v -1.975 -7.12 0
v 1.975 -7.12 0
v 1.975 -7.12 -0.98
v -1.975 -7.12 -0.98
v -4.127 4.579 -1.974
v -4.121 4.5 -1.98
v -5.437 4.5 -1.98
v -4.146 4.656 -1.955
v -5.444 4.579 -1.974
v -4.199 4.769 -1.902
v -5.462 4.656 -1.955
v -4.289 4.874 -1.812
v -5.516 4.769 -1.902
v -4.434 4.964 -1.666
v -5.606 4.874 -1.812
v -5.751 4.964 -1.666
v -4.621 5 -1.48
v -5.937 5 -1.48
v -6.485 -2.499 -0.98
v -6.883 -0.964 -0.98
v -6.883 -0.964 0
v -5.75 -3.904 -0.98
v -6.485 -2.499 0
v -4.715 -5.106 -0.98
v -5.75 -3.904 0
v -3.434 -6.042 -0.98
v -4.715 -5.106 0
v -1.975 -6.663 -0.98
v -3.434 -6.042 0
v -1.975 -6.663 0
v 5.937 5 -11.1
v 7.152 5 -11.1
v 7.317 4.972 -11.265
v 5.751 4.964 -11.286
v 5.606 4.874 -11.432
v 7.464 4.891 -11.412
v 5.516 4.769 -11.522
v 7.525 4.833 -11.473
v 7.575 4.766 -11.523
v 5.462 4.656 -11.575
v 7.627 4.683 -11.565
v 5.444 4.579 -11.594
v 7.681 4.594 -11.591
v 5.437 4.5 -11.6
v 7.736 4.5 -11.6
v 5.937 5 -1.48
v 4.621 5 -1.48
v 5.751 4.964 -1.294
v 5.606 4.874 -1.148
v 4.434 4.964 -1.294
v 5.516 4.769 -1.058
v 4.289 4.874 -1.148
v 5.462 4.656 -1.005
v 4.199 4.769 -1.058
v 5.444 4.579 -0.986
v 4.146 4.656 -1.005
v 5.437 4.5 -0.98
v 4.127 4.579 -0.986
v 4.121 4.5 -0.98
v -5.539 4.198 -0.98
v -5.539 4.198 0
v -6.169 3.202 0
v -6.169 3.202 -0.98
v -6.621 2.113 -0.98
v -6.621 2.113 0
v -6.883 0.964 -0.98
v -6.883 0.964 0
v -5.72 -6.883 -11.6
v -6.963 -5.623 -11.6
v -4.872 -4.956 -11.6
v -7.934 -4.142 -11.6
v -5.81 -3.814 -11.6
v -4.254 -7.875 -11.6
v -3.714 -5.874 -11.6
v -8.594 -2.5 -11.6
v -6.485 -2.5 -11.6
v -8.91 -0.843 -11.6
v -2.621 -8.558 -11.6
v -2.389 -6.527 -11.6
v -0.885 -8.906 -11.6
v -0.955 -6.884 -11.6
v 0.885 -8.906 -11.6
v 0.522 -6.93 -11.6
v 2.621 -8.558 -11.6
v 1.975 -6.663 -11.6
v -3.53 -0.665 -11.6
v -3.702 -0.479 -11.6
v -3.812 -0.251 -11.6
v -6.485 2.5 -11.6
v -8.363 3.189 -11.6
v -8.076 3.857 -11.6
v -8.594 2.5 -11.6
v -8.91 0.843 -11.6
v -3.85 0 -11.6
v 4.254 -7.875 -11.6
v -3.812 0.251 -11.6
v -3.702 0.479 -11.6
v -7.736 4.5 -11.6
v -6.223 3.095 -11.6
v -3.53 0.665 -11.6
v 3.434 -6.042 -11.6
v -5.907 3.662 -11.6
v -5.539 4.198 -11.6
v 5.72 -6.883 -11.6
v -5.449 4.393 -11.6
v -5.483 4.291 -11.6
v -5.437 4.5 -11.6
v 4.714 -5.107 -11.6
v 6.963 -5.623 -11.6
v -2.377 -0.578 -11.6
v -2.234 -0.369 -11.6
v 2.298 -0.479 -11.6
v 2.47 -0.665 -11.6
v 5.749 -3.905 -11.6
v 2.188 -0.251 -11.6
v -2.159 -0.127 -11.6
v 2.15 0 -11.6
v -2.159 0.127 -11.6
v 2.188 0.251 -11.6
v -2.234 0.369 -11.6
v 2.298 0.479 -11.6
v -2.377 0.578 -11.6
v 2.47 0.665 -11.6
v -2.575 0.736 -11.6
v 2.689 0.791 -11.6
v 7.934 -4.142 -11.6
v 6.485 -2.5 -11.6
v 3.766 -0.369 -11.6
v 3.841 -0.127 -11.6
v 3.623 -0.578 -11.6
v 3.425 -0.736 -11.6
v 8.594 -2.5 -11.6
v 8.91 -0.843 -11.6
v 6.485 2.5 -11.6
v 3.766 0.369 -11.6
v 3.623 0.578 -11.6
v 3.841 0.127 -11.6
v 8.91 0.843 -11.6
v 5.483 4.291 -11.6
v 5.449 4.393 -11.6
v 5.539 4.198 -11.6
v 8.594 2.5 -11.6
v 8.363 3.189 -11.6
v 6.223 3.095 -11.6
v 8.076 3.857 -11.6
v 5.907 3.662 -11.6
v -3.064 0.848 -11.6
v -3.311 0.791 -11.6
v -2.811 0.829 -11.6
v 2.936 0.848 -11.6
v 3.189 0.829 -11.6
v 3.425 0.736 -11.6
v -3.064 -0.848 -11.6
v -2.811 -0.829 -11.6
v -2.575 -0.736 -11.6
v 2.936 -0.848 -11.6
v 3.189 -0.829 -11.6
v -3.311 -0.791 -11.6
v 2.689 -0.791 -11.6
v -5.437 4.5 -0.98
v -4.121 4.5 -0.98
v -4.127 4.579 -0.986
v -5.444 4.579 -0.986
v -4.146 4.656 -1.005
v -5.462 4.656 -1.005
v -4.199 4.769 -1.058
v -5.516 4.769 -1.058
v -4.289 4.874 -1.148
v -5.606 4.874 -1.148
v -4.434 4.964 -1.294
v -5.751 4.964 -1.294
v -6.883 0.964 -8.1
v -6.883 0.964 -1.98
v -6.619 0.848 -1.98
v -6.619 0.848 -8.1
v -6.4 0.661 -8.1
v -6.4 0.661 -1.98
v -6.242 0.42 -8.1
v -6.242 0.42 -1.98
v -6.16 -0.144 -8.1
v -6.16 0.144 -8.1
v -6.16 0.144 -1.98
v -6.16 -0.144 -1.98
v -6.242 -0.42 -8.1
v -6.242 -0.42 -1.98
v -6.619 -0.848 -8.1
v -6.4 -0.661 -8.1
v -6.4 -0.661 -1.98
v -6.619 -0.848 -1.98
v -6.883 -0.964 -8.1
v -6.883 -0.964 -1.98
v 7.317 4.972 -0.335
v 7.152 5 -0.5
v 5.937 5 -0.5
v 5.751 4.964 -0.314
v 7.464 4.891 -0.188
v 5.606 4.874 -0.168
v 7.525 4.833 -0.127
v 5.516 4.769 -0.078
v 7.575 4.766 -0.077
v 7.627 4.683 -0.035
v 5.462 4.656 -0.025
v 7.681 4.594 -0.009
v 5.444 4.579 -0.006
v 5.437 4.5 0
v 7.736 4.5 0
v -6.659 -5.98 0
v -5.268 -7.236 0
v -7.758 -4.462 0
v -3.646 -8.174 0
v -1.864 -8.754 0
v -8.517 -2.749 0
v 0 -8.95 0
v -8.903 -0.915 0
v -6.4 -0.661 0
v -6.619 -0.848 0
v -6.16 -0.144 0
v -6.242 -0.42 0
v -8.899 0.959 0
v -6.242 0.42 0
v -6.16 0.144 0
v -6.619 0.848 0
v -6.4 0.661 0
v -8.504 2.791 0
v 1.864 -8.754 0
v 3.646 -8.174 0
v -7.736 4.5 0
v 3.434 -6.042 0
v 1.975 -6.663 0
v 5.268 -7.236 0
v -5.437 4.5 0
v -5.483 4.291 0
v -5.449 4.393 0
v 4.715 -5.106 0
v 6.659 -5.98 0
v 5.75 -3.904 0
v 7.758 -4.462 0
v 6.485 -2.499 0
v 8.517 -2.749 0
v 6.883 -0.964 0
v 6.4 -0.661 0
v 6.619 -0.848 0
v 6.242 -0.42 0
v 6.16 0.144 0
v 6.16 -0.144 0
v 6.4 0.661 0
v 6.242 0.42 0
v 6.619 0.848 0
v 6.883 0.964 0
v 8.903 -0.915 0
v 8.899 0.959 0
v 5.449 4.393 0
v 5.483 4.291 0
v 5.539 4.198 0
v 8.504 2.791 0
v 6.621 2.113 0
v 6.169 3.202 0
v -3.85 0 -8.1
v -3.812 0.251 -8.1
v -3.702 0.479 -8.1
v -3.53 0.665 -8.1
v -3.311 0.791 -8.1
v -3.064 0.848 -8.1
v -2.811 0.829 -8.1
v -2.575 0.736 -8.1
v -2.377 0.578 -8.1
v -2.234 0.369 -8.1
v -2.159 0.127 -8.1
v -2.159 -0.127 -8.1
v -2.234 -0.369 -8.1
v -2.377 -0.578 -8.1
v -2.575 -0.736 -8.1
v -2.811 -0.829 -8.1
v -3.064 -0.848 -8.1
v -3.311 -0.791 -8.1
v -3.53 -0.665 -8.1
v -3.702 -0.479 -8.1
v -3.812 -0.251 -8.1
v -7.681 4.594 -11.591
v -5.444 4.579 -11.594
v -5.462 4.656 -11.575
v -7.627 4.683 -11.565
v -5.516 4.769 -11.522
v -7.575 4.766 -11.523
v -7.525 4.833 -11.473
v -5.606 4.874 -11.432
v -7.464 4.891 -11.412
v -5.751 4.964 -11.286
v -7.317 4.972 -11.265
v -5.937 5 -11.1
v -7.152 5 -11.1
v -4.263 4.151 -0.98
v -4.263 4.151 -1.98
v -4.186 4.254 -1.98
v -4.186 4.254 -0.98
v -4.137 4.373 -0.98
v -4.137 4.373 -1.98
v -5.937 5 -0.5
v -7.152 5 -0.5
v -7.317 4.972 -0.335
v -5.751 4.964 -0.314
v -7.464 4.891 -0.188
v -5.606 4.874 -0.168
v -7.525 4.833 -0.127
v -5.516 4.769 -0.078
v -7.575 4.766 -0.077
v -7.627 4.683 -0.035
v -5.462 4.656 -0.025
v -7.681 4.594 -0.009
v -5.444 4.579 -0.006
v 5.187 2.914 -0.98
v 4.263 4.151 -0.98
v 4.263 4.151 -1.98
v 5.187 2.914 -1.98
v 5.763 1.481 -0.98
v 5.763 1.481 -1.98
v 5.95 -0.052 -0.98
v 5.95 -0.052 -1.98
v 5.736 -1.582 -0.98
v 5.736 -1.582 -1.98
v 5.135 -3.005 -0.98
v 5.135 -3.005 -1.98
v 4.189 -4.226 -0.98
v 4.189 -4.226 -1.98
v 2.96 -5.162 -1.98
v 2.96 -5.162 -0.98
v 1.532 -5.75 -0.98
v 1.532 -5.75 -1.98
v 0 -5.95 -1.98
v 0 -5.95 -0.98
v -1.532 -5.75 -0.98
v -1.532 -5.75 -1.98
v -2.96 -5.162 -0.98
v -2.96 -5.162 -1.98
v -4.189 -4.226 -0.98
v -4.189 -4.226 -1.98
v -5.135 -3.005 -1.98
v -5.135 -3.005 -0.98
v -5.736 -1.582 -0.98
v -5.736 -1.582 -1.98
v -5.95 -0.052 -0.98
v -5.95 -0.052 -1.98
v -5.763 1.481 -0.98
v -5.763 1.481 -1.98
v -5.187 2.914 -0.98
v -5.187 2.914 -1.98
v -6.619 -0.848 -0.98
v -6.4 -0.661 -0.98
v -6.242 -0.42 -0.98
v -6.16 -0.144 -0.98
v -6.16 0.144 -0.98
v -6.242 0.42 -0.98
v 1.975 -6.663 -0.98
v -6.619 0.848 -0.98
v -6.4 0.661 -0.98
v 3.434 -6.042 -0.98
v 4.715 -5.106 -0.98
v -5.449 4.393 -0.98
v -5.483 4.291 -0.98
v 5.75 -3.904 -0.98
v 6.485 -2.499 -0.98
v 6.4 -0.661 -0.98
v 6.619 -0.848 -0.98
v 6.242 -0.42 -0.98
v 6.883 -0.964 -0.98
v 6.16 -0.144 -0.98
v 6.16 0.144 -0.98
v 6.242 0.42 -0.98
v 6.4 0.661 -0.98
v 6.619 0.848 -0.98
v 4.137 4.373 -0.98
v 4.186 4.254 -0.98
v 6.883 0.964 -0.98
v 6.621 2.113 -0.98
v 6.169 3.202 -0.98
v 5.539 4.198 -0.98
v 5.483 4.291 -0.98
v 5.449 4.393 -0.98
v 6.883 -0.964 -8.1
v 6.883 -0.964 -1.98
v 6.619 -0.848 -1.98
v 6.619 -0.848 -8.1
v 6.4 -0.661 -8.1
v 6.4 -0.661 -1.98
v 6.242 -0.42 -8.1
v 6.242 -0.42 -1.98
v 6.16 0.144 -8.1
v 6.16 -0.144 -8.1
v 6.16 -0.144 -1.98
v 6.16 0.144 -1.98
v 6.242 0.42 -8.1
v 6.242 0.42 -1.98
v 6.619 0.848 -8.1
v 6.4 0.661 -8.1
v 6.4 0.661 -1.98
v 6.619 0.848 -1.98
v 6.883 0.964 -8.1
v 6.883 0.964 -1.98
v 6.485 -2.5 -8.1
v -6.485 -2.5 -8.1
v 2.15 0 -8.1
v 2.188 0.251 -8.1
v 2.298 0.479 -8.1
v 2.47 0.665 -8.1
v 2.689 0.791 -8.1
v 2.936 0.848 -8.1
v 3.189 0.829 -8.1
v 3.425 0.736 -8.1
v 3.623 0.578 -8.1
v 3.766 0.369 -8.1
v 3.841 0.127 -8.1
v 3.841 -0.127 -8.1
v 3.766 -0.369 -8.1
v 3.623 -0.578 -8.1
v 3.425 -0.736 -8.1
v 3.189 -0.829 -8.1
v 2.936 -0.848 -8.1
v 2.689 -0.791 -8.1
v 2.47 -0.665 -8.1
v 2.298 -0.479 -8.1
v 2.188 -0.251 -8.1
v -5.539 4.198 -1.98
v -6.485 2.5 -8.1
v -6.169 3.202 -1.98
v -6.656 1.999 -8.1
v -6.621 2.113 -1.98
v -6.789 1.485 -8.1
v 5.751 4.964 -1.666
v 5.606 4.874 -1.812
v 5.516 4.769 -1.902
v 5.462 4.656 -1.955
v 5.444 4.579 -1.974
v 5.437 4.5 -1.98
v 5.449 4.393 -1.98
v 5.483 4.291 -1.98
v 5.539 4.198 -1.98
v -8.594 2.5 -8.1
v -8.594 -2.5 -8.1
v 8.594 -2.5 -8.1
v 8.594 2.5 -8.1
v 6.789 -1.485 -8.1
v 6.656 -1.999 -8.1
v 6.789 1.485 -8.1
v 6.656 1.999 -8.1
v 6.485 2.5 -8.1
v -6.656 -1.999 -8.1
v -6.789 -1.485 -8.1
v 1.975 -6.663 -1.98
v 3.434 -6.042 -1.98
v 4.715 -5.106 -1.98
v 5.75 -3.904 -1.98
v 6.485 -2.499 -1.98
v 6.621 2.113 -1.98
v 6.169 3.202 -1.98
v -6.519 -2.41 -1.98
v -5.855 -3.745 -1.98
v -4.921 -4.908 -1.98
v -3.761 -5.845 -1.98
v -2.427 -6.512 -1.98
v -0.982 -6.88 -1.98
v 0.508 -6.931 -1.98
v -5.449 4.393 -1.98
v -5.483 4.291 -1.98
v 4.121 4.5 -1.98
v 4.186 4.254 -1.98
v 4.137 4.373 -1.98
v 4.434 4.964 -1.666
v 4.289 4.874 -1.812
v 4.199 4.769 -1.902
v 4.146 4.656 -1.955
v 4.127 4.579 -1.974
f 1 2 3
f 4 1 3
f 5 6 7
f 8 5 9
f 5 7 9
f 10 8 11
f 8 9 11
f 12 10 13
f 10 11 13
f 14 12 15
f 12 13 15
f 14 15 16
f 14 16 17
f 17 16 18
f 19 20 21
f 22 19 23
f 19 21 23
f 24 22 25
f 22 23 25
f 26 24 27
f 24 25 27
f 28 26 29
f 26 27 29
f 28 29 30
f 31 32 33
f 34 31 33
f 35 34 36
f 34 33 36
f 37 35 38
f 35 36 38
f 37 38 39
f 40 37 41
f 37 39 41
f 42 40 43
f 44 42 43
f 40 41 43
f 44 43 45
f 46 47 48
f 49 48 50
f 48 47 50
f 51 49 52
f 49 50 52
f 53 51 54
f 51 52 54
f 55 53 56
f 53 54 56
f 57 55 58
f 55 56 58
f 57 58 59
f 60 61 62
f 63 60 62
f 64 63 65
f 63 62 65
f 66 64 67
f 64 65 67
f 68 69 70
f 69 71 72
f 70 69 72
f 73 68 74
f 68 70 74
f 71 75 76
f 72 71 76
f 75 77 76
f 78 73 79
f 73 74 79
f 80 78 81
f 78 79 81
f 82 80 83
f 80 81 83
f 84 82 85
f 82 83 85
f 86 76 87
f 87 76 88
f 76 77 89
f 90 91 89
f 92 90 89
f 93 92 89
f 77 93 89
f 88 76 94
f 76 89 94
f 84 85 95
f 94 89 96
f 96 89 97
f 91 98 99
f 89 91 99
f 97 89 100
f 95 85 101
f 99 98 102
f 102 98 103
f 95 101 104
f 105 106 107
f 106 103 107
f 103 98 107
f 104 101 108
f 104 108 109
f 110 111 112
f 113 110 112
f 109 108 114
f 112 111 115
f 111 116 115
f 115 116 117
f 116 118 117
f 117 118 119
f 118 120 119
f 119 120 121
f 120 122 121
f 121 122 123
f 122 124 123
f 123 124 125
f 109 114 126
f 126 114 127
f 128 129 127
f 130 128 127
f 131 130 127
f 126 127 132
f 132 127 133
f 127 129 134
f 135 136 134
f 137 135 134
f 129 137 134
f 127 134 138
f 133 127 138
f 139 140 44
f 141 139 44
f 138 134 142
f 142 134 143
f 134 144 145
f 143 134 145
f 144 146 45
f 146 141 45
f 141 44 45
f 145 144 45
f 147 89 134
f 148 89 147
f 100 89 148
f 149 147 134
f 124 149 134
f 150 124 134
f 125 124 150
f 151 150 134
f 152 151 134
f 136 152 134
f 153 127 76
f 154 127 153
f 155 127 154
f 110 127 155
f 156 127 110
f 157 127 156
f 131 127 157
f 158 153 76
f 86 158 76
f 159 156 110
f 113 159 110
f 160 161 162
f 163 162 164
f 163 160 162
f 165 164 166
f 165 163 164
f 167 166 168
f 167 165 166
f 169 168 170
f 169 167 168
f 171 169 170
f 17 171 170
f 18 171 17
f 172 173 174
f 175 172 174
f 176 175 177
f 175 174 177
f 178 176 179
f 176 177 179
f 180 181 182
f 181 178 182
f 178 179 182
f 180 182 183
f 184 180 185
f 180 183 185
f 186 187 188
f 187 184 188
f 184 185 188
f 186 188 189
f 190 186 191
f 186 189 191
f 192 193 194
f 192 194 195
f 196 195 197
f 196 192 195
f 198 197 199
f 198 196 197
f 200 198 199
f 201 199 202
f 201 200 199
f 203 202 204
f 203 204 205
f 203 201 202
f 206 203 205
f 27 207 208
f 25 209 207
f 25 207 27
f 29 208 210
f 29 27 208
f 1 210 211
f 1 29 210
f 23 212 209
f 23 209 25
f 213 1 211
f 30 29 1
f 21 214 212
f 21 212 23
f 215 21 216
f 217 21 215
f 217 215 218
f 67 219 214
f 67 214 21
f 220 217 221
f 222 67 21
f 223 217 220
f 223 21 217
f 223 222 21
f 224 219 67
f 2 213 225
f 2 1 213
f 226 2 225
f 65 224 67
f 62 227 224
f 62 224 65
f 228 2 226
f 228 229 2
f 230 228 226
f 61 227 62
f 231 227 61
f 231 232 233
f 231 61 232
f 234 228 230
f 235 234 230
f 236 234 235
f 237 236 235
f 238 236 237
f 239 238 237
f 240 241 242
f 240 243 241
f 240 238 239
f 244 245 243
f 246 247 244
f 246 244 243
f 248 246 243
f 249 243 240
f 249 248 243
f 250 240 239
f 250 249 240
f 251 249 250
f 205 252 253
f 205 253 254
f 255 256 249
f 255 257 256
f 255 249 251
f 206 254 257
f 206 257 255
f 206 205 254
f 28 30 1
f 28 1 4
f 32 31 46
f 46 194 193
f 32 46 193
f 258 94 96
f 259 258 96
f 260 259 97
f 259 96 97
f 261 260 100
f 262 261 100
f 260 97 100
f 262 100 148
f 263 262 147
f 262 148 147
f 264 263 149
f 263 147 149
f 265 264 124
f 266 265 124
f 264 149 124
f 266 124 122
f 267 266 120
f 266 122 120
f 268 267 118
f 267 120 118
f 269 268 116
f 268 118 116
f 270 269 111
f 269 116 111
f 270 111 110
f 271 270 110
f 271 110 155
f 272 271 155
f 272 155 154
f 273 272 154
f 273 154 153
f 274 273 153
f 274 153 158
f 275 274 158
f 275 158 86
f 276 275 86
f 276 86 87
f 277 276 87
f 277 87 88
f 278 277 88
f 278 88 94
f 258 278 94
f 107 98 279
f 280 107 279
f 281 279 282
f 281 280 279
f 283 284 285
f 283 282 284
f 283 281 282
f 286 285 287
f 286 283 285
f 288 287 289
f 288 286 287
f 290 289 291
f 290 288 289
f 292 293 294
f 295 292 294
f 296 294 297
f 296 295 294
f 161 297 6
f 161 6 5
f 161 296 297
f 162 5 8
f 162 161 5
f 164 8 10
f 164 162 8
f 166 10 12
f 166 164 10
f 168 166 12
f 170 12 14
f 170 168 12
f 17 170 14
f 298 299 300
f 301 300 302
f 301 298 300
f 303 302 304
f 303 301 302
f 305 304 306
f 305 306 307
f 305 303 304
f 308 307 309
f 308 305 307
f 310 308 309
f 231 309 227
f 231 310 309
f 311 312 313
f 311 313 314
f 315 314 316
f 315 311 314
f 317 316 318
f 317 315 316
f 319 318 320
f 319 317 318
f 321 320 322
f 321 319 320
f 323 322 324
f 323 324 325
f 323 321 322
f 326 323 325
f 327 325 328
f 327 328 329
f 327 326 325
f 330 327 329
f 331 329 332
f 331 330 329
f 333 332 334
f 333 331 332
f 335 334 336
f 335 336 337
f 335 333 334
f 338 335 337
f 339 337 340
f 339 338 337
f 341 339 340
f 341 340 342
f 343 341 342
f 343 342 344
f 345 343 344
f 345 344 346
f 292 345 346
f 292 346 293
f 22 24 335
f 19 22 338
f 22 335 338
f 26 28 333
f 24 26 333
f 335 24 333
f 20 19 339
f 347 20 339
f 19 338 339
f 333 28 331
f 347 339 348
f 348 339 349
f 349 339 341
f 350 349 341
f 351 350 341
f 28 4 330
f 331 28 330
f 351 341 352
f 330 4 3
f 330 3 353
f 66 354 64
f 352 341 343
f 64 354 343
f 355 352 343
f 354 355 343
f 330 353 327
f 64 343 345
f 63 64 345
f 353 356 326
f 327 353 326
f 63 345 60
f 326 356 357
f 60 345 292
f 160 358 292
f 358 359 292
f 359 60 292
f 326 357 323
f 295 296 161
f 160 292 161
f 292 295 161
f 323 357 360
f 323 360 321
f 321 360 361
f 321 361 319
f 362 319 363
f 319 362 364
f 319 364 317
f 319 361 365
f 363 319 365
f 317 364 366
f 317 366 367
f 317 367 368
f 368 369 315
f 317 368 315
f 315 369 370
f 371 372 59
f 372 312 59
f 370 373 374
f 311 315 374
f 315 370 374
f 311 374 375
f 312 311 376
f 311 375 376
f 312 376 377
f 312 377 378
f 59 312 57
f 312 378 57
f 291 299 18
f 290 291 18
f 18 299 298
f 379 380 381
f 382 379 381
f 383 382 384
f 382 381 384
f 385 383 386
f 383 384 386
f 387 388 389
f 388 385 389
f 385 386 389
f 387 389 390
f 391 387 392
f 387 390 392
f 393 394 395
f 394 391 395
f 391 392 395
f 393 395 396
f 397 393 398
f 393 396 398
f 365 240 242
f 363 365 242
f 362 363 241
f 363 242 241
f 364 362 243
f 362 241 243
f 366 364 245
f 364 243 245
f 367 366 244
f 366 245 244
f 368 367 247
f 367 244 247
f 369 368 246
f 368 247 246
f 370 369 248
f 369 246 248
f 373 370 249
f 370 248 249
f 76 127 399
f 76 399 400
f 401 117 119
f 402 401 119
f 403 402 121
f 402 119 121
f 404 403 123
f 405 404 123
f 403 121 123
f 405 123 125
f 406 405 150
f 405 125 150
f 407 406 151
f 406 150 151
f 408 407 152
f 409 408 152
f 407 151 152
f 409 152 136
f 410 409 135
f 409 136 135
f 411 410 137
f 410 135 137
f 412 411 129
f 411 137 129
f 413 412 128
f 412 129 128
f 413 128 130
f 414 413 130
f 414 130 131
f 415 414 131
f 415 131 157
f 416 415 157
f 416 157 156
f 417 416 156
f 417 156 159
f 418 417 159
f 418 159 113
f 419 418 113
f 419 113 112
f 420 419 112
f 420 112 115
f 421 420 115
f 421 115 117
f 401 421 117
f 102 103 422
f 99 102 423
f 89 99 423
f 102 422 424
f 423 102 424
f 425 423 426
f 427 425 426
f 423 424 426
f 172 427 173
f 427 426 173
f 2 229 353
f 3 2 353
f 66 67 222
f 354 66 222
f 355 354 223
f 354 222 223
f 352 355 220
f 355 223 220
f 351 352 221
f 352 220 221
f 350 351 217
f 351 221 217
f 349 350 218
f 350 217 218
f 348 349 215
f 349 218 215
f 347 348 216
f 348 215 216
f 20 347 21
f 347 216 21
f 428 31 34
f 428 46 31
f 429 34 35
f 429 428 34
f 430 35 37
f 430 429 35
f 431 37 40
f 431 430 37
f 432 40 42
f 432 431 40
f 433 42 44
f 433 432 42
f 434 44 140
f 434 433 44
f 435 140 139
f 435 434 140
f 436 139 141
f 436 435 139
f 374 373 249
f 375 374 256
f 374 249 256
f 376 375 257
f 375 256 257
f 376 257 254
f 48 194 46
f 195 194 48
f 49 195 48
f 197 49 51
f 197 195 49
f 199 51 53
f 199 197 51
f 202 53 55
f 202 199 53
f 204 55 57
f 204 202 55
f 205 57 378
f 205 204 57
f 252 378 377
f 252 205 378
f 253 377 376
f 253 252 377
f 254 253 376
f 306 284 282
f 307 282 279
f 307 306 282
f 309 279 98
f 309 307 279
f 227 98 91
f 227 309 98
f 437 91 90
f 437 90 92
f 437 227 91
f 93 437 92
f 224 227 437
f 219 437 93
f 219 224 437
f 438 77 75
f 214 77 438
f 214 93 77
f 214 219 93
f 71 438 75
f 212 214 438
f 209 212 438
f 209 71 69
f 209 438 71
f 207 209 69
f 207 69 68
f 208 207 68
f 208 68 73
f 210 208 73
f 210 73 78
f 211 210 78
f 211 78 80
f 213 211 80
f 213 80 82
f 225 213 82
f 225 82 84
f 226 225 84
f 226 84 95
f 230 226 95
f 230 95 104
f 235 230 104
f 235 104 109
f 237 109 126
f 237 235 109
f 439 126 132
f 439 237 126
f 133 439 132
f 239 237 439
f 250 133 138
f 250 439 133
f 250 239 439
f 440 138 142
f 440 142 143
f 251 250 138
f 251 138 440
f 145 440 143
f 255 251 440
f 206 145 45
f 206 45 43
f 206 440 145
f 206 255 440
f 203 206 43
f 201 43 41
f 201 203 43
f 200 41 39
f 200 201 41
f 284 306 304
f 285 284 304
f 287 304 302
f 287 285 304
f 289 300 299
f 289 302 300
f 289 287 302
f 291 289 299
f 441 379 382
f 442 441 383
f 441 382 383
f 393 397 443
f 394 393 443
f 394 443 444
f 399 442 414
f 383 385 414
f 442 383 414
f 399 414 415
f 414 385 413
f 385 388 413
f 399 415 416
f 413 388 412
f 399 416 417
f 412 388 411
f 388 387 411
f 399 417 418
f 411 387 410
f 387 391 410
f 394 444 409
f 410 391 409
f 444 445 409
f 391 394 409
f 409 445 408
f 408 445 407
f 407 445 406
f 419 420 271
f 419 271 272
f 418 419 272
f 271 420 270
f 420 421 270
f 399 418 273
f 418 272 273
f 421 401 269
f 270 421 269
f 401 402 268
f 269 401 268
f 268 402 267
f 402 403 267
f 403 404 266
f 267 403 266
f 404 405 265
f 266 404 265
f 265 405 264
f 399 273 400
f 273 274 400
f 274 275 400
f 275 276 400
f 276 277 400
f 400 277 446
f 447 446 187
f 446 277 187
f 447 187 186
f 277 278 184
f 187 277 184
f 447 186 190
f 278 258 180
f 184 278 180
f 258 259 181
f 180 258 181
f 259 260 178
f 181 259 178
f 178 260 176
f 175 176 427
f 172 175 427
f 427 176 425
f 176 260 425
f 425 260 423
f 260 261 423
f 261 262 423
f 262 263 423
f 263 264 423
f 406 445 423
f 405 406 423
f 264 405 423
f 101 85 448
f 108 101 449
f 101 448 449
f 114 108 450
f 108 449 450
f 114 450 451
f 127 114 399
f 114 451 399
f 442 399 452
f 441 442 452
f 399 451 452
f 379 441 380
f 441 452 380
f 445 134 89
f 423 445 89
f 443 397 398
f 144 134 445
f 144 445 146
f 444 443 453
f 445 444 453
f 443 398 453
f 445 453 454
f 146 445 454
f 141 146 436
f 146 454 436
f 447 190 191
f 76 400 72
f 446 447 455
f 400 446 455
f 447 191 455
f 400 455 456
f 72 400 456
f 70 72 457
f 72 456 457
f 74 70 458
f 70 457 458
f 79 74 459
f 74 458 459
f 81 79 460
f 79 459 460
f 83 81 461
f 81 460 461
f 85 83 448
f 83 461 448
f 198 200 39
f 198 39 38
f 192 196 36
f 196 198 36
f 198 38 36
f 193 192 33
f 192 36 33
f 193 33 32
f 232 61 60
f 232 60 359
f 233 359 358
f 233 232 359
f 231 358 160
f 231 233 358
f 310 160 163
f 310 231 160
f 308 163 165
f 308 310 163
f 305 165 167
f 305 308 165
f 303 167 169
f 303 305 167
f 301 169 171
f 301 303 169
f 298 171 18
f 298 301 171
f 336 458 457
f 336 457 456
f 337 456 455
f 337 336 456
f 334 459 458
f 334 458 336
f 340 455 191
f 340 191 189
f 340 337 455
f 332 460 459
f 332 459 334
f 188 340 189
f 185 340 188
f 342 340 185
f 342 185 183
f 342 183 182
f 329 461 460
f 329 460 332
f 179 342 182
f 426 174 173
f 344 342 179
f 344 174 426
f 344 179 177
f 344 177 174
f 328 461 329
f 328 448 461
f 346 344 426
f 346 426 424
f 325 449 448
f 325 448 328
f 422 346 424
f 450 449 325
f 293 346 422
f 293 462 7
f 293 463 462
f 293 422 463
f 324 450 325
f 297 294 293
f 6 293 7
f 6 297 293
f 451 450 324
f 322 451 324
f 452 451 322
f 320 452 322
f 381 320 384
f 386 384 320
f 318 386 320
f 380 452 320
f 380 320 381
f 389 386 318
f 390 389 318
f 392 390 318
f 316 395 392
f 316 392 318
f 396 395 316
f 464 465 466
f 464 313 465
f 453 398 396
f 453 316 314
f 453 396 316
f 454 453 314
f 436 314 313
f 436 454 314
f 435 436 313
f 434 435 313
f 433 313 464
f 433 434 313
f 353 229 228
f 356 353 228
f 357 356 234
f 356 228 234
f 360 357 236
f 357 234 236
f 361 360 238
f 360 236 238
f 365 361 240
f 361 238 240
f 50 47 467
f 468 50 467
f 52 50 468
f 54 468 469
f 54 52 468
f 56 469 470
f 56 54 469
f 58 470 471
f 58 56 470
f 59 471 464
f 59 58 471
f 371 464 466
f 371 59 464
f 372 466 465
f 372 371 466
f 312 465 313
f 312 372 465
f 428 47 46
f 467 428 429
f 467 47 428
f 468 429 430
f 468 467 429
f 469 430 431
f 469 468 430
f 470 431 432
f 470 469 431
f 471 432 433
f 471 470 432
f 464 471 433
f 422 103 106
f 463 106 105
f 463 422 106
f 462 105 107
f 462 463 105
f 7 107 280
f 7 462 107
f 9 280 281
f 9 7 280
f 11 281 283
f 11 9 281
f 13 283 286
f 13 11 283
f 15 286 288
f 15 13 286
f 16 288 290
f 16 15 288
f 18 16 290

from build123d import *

# Parameters (mm, degrees)
SKETCH_3_R          = 6.95
SKETCH_3_R_2        = 5.95
EXTRUDE_3_DEPTH     = 1
SKETCH_1_R          = 8.95
EXTRUDE_1_DEPTH     = 11.6
CUT_EXTRUDE_1_DEPTH = 18.16872156
FILLET_4_R          = 0.5
SKETCH_5_W          = 17.187495454
SKETCH_5_H          = 5
EXTRUDE_4_DEPTH     = 3.5
SKETCH_6_W          = 0.98
SKETCH_6_H          = 0.456526807
CUT_EXTRUDE_2_DEPTH = 3.95
CUT_EXTRUDE_3_REACH = 19.169
SKETCH_8_R          = 0.85


with BuildPart() as part:
    # 草图3 → 凸台-拉伸3 (new body)
    with BuildSketch(Plane(origin=(0, 0, -0.98), x_dir=(-1, 0, 0), z_dir=(0, 0, -1))):
        with Locations(Location((0, 0, 0), (0, 0, 90))):
            Circle(SKETCH_3_R)
        with Locations(Location((0, 0, 0), (0, 0, 90))):
            Circle(SKETCH_3_R_2, mode=Mode.SUBTRACT)
    extrude(amount=EXTRUDE_3_DEPTH)

    # 草图1 → 凸台-拉伸1 (add)
    with BuildSketch(Plane.XY):
        Circle(SKETCH_1_R)
        with BuildLine():
            ThreePointArc((1.975, 6.663473193), (-3.760818846, 5.844548024), (-6.882867133, 0.963659707))
            ThreePointArc((-6.882867133, 0.963659707), (-6.15, 0), (-6.882867133, -0.963659707))
            ThreePointArc((-6.882867133, -0.963659707), (-3.760818846, -5.844548024), (1.975, -6.663473193))
            ThreePointArc((1.975, -6.663473193), (5.266632793, -4.53487365), (6.882867133, -0.963659707))
            ThreePointArc((6.882867133, -0.963659707), (6.15, 0), (6.882867133, 0.963659707))
            ThreePointArc((6.882867133, 0.963659707), (5.266632793, 4.53487365), (1.975, 6.663473193))
        make_face(mode=Mode.SUBTRACT)
    extrude(amount=-EXTRUDE_1_DEPTH)

    # 草图4 → 切除-拉伸1 (cut, through all)
    with BuildSketch(Plane.XY):
        with BuildLine():
            Line((-7.423105819, 5), (7.423105819, 5))
            ThreePointArc((7.423105819, 5), (0, 8.95), (-7.423105819, 5))
        make_face()
    extrude(amount=-CUT_EXTRUDE_1_DEPTH, mode=Mode.SUBTRACT)

    # 圆角4
    fillet_4_edges = [part.edges().sort_by_distance(p)[0] for p in [
        (6.125186063, 5, -11.6),
        (-6.125186063, 5, 0),
        (6.125186063, 5, 0),
        (4.827266307, 5, -0.49),
        (4.026278496, 5, -0.98),
        (4.827266307, 5, -6.79),
        (7.423105819, 5, -5.8),
        (-4.026278496, 5, -0.98),
        (-4.827266307, 5, -0.49),
        (-6.125186063, 5, -11.6),
        (-4.827266307, 5, -6.79),
        (-7.423105819, 5, -5.8),
        (-3.225290685, 5, -1.48),
        (-4.026278496, 5, -1.98),
        (4.026278496, 5, -1.98),
        (3.225290685, 5, -1.48),
    ]]
    fillet(fillet_4_edges, radius=FILLET_4_R - 0.0001)  # a hair under: the kernel refuses the full size

    # 草图5 → 凸台-拉伸4 (add)
    with BuildSketch(Plane(origin=(0, 0, -11.6), x_dir=(-1, 0, 0), z_dir=(0, 0, -1))):
        Rectangle(SKETCH_5_W, SKETCH_5_H)
    extrude(amount=-EXTRUDE_4_DEPTH)

    # 草图6 → 切除-拉伸2 (cut)
    with BuildSketch(Plane(origin=(1.975, 0, 0), x_dir=(0, 0, -1), z_dir=(1, 0, 0))):
        with Locations((0.49, -6.891736597)):
            Rectangle(SKETCH_6_W, SKETCH_6_H)
    extrude(amount=-CUT_EXTRUDE_2_DEPTH, mode=Mode.SUBTRACT)

    # 草图8 → 切除-拉伸3 (cut, up to next)
    with BuildSketch(Plane(origin=(0, 0, -11.6), x_dir=(-1, 0, 0), z_dir=(0, 0, -1)), mode=Mode.PRIVATE) as cut_extrude_3_sk1:
        with Locations((-3, 0)):
            Circle(SKETCH_8_R)
    cut_extrude_3_tool1 = extrude(cut_extrude_3_sk1.sketch, amount=-CUT_EXTRUDE_3_REACH, mode=Mode.PRIVATE) & part.part
    # 草图8 → 切除-拉伸3 (cut, up to next)
    with BuildSketch(Plane(origin=(0, 0, -11.6), x_dir=(-1, 0, 0), z_dir=(0, 0, -1)), mode=Mode.PRIVATE) as cut_extrude_3_sk2:
        with Locations((3, 0)):
            Circle(SKETCH_8_R)
    cut_extrude_3_tool2 = extrude(cut_extrude_3_sk2.sketch, amount=-CUT_EXTRUDE_3_REACH, mode=Mode.PRIVATE) & part.part
    add(cut_extrude_3_tool1.solids().sort_by_distance((3, 0, -11.6))[0], mode=Mode.SUBTRACT)
    add(cut_extrude_3_tool2.solids().sort_by_distance((-3, 0, -11.6))[0], mode=Mode.SUBTRACT)


solid = part.part
